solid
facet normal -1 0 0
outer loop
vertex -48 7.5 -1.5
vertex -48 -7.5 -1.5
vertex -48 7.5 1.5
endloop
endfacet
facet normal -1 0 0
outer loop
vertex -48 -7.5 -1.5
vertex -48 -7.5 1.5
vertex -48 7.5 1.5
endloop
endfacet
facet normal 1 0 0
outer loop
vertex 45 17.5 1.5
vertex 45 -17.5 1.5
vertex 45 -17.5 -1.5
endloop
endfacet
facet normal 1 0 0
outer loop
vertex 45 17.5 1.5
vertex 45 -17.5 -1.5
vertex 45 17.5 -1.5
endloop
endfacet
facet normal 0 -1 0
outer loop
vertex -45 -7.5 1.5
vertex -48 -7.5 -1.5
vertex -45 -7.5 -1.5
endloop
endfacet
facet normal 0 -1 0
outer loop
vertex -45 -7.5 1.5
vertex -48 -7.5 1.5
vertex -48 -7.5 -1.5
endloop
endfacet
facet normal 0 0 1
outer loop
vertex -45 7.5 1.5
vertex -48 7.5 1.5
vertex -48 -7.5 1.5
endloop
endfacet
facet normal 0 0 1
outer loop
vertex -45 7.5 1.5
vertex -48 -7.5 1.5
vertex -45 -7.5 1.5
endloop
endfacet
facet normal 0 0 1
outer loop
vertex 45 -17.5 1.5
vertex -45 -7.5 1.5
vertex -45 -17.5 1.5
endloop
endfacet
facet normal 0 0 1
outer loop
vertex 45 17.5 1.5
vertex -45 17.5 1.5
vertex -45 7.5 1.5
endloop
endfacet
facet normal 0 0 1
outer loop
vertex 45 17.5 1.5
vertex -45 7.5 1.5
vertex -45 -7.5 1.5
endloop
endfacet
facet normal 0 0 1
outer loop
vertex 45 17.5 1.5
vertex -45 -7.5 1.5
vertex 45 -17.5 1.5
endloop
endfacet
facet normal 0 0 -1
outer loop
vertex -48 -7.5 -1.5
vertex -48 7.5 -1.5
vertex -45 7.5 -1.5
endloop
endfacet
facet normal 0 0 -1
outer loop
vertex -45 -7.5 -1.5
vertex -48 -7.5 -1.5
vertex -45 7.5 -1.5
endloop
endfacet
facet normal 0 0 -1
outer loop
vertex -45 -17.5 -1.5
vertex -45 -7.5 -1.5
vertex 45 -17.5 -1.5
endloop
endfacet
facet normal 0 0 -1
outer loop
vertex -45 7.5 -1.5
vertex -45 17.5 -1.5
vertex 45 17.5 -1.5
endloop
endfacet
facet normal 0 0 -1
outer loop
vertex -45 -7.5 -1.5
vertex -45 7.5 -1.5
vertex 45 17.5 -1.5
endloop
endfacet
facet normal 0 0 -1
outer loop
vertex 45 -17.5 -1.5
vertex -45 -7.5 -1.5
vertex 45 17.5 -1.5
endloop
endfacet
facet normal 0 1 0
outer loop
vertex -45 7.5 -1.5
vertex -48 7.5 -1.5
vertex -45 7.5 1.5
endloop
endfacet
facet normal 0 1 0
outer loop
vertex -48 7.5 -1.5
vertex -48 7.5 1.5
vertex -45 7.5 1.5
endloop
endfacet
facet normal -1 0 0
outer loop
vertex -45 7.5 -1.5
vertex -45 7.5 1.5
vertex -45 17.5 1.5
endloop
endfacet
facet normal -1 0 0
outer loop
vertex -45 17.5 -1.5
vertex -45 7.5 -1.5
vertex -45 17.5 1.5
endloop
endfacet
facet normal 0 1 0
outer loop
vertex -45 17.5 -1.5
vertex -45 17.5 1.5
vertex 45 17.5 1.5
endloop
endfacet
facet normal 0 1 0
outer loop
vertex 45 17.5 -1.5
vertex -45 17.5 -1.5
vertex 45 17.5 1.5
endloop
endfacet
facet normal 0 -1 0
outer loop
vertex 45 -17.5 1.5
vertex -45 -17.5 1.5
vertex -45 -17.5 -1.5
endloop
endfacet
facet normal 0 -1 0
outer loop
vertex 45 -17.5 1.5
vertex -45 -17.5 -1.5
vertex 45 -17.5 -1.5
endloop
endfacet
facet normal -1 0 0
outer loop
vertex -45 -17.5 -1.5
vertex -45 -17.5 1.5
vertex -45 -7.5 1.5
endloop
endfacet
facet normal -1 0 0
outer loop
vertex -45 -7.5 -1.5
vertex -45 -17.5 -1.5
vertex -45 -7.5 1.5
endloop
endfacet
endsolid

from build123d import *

# Parameters (mm, degrees)
SKETCH1_W           = 90
SKETCH1_H           = 35
SKETCH1_W_2         = 3
SKETCH1_H_2         = 15
BOSS_EXTRUDE1_DEPTH = 1.5


with BuildPart() as part:
    # Sketch1 → Boss-Extrude1 (new, symmetric)
    with BuildSketch(Plane.XY):
        Rectangle(SKETCH1_W, SKETCH1_H)
        with Locations((-46.5, 0)):
            Rectangle(SKETCH1_W_2, SKETCH1_H_2)
    extrude(amount=BOSS_EXTRUDE1_DEPTH, both=True)


solid = part.part
